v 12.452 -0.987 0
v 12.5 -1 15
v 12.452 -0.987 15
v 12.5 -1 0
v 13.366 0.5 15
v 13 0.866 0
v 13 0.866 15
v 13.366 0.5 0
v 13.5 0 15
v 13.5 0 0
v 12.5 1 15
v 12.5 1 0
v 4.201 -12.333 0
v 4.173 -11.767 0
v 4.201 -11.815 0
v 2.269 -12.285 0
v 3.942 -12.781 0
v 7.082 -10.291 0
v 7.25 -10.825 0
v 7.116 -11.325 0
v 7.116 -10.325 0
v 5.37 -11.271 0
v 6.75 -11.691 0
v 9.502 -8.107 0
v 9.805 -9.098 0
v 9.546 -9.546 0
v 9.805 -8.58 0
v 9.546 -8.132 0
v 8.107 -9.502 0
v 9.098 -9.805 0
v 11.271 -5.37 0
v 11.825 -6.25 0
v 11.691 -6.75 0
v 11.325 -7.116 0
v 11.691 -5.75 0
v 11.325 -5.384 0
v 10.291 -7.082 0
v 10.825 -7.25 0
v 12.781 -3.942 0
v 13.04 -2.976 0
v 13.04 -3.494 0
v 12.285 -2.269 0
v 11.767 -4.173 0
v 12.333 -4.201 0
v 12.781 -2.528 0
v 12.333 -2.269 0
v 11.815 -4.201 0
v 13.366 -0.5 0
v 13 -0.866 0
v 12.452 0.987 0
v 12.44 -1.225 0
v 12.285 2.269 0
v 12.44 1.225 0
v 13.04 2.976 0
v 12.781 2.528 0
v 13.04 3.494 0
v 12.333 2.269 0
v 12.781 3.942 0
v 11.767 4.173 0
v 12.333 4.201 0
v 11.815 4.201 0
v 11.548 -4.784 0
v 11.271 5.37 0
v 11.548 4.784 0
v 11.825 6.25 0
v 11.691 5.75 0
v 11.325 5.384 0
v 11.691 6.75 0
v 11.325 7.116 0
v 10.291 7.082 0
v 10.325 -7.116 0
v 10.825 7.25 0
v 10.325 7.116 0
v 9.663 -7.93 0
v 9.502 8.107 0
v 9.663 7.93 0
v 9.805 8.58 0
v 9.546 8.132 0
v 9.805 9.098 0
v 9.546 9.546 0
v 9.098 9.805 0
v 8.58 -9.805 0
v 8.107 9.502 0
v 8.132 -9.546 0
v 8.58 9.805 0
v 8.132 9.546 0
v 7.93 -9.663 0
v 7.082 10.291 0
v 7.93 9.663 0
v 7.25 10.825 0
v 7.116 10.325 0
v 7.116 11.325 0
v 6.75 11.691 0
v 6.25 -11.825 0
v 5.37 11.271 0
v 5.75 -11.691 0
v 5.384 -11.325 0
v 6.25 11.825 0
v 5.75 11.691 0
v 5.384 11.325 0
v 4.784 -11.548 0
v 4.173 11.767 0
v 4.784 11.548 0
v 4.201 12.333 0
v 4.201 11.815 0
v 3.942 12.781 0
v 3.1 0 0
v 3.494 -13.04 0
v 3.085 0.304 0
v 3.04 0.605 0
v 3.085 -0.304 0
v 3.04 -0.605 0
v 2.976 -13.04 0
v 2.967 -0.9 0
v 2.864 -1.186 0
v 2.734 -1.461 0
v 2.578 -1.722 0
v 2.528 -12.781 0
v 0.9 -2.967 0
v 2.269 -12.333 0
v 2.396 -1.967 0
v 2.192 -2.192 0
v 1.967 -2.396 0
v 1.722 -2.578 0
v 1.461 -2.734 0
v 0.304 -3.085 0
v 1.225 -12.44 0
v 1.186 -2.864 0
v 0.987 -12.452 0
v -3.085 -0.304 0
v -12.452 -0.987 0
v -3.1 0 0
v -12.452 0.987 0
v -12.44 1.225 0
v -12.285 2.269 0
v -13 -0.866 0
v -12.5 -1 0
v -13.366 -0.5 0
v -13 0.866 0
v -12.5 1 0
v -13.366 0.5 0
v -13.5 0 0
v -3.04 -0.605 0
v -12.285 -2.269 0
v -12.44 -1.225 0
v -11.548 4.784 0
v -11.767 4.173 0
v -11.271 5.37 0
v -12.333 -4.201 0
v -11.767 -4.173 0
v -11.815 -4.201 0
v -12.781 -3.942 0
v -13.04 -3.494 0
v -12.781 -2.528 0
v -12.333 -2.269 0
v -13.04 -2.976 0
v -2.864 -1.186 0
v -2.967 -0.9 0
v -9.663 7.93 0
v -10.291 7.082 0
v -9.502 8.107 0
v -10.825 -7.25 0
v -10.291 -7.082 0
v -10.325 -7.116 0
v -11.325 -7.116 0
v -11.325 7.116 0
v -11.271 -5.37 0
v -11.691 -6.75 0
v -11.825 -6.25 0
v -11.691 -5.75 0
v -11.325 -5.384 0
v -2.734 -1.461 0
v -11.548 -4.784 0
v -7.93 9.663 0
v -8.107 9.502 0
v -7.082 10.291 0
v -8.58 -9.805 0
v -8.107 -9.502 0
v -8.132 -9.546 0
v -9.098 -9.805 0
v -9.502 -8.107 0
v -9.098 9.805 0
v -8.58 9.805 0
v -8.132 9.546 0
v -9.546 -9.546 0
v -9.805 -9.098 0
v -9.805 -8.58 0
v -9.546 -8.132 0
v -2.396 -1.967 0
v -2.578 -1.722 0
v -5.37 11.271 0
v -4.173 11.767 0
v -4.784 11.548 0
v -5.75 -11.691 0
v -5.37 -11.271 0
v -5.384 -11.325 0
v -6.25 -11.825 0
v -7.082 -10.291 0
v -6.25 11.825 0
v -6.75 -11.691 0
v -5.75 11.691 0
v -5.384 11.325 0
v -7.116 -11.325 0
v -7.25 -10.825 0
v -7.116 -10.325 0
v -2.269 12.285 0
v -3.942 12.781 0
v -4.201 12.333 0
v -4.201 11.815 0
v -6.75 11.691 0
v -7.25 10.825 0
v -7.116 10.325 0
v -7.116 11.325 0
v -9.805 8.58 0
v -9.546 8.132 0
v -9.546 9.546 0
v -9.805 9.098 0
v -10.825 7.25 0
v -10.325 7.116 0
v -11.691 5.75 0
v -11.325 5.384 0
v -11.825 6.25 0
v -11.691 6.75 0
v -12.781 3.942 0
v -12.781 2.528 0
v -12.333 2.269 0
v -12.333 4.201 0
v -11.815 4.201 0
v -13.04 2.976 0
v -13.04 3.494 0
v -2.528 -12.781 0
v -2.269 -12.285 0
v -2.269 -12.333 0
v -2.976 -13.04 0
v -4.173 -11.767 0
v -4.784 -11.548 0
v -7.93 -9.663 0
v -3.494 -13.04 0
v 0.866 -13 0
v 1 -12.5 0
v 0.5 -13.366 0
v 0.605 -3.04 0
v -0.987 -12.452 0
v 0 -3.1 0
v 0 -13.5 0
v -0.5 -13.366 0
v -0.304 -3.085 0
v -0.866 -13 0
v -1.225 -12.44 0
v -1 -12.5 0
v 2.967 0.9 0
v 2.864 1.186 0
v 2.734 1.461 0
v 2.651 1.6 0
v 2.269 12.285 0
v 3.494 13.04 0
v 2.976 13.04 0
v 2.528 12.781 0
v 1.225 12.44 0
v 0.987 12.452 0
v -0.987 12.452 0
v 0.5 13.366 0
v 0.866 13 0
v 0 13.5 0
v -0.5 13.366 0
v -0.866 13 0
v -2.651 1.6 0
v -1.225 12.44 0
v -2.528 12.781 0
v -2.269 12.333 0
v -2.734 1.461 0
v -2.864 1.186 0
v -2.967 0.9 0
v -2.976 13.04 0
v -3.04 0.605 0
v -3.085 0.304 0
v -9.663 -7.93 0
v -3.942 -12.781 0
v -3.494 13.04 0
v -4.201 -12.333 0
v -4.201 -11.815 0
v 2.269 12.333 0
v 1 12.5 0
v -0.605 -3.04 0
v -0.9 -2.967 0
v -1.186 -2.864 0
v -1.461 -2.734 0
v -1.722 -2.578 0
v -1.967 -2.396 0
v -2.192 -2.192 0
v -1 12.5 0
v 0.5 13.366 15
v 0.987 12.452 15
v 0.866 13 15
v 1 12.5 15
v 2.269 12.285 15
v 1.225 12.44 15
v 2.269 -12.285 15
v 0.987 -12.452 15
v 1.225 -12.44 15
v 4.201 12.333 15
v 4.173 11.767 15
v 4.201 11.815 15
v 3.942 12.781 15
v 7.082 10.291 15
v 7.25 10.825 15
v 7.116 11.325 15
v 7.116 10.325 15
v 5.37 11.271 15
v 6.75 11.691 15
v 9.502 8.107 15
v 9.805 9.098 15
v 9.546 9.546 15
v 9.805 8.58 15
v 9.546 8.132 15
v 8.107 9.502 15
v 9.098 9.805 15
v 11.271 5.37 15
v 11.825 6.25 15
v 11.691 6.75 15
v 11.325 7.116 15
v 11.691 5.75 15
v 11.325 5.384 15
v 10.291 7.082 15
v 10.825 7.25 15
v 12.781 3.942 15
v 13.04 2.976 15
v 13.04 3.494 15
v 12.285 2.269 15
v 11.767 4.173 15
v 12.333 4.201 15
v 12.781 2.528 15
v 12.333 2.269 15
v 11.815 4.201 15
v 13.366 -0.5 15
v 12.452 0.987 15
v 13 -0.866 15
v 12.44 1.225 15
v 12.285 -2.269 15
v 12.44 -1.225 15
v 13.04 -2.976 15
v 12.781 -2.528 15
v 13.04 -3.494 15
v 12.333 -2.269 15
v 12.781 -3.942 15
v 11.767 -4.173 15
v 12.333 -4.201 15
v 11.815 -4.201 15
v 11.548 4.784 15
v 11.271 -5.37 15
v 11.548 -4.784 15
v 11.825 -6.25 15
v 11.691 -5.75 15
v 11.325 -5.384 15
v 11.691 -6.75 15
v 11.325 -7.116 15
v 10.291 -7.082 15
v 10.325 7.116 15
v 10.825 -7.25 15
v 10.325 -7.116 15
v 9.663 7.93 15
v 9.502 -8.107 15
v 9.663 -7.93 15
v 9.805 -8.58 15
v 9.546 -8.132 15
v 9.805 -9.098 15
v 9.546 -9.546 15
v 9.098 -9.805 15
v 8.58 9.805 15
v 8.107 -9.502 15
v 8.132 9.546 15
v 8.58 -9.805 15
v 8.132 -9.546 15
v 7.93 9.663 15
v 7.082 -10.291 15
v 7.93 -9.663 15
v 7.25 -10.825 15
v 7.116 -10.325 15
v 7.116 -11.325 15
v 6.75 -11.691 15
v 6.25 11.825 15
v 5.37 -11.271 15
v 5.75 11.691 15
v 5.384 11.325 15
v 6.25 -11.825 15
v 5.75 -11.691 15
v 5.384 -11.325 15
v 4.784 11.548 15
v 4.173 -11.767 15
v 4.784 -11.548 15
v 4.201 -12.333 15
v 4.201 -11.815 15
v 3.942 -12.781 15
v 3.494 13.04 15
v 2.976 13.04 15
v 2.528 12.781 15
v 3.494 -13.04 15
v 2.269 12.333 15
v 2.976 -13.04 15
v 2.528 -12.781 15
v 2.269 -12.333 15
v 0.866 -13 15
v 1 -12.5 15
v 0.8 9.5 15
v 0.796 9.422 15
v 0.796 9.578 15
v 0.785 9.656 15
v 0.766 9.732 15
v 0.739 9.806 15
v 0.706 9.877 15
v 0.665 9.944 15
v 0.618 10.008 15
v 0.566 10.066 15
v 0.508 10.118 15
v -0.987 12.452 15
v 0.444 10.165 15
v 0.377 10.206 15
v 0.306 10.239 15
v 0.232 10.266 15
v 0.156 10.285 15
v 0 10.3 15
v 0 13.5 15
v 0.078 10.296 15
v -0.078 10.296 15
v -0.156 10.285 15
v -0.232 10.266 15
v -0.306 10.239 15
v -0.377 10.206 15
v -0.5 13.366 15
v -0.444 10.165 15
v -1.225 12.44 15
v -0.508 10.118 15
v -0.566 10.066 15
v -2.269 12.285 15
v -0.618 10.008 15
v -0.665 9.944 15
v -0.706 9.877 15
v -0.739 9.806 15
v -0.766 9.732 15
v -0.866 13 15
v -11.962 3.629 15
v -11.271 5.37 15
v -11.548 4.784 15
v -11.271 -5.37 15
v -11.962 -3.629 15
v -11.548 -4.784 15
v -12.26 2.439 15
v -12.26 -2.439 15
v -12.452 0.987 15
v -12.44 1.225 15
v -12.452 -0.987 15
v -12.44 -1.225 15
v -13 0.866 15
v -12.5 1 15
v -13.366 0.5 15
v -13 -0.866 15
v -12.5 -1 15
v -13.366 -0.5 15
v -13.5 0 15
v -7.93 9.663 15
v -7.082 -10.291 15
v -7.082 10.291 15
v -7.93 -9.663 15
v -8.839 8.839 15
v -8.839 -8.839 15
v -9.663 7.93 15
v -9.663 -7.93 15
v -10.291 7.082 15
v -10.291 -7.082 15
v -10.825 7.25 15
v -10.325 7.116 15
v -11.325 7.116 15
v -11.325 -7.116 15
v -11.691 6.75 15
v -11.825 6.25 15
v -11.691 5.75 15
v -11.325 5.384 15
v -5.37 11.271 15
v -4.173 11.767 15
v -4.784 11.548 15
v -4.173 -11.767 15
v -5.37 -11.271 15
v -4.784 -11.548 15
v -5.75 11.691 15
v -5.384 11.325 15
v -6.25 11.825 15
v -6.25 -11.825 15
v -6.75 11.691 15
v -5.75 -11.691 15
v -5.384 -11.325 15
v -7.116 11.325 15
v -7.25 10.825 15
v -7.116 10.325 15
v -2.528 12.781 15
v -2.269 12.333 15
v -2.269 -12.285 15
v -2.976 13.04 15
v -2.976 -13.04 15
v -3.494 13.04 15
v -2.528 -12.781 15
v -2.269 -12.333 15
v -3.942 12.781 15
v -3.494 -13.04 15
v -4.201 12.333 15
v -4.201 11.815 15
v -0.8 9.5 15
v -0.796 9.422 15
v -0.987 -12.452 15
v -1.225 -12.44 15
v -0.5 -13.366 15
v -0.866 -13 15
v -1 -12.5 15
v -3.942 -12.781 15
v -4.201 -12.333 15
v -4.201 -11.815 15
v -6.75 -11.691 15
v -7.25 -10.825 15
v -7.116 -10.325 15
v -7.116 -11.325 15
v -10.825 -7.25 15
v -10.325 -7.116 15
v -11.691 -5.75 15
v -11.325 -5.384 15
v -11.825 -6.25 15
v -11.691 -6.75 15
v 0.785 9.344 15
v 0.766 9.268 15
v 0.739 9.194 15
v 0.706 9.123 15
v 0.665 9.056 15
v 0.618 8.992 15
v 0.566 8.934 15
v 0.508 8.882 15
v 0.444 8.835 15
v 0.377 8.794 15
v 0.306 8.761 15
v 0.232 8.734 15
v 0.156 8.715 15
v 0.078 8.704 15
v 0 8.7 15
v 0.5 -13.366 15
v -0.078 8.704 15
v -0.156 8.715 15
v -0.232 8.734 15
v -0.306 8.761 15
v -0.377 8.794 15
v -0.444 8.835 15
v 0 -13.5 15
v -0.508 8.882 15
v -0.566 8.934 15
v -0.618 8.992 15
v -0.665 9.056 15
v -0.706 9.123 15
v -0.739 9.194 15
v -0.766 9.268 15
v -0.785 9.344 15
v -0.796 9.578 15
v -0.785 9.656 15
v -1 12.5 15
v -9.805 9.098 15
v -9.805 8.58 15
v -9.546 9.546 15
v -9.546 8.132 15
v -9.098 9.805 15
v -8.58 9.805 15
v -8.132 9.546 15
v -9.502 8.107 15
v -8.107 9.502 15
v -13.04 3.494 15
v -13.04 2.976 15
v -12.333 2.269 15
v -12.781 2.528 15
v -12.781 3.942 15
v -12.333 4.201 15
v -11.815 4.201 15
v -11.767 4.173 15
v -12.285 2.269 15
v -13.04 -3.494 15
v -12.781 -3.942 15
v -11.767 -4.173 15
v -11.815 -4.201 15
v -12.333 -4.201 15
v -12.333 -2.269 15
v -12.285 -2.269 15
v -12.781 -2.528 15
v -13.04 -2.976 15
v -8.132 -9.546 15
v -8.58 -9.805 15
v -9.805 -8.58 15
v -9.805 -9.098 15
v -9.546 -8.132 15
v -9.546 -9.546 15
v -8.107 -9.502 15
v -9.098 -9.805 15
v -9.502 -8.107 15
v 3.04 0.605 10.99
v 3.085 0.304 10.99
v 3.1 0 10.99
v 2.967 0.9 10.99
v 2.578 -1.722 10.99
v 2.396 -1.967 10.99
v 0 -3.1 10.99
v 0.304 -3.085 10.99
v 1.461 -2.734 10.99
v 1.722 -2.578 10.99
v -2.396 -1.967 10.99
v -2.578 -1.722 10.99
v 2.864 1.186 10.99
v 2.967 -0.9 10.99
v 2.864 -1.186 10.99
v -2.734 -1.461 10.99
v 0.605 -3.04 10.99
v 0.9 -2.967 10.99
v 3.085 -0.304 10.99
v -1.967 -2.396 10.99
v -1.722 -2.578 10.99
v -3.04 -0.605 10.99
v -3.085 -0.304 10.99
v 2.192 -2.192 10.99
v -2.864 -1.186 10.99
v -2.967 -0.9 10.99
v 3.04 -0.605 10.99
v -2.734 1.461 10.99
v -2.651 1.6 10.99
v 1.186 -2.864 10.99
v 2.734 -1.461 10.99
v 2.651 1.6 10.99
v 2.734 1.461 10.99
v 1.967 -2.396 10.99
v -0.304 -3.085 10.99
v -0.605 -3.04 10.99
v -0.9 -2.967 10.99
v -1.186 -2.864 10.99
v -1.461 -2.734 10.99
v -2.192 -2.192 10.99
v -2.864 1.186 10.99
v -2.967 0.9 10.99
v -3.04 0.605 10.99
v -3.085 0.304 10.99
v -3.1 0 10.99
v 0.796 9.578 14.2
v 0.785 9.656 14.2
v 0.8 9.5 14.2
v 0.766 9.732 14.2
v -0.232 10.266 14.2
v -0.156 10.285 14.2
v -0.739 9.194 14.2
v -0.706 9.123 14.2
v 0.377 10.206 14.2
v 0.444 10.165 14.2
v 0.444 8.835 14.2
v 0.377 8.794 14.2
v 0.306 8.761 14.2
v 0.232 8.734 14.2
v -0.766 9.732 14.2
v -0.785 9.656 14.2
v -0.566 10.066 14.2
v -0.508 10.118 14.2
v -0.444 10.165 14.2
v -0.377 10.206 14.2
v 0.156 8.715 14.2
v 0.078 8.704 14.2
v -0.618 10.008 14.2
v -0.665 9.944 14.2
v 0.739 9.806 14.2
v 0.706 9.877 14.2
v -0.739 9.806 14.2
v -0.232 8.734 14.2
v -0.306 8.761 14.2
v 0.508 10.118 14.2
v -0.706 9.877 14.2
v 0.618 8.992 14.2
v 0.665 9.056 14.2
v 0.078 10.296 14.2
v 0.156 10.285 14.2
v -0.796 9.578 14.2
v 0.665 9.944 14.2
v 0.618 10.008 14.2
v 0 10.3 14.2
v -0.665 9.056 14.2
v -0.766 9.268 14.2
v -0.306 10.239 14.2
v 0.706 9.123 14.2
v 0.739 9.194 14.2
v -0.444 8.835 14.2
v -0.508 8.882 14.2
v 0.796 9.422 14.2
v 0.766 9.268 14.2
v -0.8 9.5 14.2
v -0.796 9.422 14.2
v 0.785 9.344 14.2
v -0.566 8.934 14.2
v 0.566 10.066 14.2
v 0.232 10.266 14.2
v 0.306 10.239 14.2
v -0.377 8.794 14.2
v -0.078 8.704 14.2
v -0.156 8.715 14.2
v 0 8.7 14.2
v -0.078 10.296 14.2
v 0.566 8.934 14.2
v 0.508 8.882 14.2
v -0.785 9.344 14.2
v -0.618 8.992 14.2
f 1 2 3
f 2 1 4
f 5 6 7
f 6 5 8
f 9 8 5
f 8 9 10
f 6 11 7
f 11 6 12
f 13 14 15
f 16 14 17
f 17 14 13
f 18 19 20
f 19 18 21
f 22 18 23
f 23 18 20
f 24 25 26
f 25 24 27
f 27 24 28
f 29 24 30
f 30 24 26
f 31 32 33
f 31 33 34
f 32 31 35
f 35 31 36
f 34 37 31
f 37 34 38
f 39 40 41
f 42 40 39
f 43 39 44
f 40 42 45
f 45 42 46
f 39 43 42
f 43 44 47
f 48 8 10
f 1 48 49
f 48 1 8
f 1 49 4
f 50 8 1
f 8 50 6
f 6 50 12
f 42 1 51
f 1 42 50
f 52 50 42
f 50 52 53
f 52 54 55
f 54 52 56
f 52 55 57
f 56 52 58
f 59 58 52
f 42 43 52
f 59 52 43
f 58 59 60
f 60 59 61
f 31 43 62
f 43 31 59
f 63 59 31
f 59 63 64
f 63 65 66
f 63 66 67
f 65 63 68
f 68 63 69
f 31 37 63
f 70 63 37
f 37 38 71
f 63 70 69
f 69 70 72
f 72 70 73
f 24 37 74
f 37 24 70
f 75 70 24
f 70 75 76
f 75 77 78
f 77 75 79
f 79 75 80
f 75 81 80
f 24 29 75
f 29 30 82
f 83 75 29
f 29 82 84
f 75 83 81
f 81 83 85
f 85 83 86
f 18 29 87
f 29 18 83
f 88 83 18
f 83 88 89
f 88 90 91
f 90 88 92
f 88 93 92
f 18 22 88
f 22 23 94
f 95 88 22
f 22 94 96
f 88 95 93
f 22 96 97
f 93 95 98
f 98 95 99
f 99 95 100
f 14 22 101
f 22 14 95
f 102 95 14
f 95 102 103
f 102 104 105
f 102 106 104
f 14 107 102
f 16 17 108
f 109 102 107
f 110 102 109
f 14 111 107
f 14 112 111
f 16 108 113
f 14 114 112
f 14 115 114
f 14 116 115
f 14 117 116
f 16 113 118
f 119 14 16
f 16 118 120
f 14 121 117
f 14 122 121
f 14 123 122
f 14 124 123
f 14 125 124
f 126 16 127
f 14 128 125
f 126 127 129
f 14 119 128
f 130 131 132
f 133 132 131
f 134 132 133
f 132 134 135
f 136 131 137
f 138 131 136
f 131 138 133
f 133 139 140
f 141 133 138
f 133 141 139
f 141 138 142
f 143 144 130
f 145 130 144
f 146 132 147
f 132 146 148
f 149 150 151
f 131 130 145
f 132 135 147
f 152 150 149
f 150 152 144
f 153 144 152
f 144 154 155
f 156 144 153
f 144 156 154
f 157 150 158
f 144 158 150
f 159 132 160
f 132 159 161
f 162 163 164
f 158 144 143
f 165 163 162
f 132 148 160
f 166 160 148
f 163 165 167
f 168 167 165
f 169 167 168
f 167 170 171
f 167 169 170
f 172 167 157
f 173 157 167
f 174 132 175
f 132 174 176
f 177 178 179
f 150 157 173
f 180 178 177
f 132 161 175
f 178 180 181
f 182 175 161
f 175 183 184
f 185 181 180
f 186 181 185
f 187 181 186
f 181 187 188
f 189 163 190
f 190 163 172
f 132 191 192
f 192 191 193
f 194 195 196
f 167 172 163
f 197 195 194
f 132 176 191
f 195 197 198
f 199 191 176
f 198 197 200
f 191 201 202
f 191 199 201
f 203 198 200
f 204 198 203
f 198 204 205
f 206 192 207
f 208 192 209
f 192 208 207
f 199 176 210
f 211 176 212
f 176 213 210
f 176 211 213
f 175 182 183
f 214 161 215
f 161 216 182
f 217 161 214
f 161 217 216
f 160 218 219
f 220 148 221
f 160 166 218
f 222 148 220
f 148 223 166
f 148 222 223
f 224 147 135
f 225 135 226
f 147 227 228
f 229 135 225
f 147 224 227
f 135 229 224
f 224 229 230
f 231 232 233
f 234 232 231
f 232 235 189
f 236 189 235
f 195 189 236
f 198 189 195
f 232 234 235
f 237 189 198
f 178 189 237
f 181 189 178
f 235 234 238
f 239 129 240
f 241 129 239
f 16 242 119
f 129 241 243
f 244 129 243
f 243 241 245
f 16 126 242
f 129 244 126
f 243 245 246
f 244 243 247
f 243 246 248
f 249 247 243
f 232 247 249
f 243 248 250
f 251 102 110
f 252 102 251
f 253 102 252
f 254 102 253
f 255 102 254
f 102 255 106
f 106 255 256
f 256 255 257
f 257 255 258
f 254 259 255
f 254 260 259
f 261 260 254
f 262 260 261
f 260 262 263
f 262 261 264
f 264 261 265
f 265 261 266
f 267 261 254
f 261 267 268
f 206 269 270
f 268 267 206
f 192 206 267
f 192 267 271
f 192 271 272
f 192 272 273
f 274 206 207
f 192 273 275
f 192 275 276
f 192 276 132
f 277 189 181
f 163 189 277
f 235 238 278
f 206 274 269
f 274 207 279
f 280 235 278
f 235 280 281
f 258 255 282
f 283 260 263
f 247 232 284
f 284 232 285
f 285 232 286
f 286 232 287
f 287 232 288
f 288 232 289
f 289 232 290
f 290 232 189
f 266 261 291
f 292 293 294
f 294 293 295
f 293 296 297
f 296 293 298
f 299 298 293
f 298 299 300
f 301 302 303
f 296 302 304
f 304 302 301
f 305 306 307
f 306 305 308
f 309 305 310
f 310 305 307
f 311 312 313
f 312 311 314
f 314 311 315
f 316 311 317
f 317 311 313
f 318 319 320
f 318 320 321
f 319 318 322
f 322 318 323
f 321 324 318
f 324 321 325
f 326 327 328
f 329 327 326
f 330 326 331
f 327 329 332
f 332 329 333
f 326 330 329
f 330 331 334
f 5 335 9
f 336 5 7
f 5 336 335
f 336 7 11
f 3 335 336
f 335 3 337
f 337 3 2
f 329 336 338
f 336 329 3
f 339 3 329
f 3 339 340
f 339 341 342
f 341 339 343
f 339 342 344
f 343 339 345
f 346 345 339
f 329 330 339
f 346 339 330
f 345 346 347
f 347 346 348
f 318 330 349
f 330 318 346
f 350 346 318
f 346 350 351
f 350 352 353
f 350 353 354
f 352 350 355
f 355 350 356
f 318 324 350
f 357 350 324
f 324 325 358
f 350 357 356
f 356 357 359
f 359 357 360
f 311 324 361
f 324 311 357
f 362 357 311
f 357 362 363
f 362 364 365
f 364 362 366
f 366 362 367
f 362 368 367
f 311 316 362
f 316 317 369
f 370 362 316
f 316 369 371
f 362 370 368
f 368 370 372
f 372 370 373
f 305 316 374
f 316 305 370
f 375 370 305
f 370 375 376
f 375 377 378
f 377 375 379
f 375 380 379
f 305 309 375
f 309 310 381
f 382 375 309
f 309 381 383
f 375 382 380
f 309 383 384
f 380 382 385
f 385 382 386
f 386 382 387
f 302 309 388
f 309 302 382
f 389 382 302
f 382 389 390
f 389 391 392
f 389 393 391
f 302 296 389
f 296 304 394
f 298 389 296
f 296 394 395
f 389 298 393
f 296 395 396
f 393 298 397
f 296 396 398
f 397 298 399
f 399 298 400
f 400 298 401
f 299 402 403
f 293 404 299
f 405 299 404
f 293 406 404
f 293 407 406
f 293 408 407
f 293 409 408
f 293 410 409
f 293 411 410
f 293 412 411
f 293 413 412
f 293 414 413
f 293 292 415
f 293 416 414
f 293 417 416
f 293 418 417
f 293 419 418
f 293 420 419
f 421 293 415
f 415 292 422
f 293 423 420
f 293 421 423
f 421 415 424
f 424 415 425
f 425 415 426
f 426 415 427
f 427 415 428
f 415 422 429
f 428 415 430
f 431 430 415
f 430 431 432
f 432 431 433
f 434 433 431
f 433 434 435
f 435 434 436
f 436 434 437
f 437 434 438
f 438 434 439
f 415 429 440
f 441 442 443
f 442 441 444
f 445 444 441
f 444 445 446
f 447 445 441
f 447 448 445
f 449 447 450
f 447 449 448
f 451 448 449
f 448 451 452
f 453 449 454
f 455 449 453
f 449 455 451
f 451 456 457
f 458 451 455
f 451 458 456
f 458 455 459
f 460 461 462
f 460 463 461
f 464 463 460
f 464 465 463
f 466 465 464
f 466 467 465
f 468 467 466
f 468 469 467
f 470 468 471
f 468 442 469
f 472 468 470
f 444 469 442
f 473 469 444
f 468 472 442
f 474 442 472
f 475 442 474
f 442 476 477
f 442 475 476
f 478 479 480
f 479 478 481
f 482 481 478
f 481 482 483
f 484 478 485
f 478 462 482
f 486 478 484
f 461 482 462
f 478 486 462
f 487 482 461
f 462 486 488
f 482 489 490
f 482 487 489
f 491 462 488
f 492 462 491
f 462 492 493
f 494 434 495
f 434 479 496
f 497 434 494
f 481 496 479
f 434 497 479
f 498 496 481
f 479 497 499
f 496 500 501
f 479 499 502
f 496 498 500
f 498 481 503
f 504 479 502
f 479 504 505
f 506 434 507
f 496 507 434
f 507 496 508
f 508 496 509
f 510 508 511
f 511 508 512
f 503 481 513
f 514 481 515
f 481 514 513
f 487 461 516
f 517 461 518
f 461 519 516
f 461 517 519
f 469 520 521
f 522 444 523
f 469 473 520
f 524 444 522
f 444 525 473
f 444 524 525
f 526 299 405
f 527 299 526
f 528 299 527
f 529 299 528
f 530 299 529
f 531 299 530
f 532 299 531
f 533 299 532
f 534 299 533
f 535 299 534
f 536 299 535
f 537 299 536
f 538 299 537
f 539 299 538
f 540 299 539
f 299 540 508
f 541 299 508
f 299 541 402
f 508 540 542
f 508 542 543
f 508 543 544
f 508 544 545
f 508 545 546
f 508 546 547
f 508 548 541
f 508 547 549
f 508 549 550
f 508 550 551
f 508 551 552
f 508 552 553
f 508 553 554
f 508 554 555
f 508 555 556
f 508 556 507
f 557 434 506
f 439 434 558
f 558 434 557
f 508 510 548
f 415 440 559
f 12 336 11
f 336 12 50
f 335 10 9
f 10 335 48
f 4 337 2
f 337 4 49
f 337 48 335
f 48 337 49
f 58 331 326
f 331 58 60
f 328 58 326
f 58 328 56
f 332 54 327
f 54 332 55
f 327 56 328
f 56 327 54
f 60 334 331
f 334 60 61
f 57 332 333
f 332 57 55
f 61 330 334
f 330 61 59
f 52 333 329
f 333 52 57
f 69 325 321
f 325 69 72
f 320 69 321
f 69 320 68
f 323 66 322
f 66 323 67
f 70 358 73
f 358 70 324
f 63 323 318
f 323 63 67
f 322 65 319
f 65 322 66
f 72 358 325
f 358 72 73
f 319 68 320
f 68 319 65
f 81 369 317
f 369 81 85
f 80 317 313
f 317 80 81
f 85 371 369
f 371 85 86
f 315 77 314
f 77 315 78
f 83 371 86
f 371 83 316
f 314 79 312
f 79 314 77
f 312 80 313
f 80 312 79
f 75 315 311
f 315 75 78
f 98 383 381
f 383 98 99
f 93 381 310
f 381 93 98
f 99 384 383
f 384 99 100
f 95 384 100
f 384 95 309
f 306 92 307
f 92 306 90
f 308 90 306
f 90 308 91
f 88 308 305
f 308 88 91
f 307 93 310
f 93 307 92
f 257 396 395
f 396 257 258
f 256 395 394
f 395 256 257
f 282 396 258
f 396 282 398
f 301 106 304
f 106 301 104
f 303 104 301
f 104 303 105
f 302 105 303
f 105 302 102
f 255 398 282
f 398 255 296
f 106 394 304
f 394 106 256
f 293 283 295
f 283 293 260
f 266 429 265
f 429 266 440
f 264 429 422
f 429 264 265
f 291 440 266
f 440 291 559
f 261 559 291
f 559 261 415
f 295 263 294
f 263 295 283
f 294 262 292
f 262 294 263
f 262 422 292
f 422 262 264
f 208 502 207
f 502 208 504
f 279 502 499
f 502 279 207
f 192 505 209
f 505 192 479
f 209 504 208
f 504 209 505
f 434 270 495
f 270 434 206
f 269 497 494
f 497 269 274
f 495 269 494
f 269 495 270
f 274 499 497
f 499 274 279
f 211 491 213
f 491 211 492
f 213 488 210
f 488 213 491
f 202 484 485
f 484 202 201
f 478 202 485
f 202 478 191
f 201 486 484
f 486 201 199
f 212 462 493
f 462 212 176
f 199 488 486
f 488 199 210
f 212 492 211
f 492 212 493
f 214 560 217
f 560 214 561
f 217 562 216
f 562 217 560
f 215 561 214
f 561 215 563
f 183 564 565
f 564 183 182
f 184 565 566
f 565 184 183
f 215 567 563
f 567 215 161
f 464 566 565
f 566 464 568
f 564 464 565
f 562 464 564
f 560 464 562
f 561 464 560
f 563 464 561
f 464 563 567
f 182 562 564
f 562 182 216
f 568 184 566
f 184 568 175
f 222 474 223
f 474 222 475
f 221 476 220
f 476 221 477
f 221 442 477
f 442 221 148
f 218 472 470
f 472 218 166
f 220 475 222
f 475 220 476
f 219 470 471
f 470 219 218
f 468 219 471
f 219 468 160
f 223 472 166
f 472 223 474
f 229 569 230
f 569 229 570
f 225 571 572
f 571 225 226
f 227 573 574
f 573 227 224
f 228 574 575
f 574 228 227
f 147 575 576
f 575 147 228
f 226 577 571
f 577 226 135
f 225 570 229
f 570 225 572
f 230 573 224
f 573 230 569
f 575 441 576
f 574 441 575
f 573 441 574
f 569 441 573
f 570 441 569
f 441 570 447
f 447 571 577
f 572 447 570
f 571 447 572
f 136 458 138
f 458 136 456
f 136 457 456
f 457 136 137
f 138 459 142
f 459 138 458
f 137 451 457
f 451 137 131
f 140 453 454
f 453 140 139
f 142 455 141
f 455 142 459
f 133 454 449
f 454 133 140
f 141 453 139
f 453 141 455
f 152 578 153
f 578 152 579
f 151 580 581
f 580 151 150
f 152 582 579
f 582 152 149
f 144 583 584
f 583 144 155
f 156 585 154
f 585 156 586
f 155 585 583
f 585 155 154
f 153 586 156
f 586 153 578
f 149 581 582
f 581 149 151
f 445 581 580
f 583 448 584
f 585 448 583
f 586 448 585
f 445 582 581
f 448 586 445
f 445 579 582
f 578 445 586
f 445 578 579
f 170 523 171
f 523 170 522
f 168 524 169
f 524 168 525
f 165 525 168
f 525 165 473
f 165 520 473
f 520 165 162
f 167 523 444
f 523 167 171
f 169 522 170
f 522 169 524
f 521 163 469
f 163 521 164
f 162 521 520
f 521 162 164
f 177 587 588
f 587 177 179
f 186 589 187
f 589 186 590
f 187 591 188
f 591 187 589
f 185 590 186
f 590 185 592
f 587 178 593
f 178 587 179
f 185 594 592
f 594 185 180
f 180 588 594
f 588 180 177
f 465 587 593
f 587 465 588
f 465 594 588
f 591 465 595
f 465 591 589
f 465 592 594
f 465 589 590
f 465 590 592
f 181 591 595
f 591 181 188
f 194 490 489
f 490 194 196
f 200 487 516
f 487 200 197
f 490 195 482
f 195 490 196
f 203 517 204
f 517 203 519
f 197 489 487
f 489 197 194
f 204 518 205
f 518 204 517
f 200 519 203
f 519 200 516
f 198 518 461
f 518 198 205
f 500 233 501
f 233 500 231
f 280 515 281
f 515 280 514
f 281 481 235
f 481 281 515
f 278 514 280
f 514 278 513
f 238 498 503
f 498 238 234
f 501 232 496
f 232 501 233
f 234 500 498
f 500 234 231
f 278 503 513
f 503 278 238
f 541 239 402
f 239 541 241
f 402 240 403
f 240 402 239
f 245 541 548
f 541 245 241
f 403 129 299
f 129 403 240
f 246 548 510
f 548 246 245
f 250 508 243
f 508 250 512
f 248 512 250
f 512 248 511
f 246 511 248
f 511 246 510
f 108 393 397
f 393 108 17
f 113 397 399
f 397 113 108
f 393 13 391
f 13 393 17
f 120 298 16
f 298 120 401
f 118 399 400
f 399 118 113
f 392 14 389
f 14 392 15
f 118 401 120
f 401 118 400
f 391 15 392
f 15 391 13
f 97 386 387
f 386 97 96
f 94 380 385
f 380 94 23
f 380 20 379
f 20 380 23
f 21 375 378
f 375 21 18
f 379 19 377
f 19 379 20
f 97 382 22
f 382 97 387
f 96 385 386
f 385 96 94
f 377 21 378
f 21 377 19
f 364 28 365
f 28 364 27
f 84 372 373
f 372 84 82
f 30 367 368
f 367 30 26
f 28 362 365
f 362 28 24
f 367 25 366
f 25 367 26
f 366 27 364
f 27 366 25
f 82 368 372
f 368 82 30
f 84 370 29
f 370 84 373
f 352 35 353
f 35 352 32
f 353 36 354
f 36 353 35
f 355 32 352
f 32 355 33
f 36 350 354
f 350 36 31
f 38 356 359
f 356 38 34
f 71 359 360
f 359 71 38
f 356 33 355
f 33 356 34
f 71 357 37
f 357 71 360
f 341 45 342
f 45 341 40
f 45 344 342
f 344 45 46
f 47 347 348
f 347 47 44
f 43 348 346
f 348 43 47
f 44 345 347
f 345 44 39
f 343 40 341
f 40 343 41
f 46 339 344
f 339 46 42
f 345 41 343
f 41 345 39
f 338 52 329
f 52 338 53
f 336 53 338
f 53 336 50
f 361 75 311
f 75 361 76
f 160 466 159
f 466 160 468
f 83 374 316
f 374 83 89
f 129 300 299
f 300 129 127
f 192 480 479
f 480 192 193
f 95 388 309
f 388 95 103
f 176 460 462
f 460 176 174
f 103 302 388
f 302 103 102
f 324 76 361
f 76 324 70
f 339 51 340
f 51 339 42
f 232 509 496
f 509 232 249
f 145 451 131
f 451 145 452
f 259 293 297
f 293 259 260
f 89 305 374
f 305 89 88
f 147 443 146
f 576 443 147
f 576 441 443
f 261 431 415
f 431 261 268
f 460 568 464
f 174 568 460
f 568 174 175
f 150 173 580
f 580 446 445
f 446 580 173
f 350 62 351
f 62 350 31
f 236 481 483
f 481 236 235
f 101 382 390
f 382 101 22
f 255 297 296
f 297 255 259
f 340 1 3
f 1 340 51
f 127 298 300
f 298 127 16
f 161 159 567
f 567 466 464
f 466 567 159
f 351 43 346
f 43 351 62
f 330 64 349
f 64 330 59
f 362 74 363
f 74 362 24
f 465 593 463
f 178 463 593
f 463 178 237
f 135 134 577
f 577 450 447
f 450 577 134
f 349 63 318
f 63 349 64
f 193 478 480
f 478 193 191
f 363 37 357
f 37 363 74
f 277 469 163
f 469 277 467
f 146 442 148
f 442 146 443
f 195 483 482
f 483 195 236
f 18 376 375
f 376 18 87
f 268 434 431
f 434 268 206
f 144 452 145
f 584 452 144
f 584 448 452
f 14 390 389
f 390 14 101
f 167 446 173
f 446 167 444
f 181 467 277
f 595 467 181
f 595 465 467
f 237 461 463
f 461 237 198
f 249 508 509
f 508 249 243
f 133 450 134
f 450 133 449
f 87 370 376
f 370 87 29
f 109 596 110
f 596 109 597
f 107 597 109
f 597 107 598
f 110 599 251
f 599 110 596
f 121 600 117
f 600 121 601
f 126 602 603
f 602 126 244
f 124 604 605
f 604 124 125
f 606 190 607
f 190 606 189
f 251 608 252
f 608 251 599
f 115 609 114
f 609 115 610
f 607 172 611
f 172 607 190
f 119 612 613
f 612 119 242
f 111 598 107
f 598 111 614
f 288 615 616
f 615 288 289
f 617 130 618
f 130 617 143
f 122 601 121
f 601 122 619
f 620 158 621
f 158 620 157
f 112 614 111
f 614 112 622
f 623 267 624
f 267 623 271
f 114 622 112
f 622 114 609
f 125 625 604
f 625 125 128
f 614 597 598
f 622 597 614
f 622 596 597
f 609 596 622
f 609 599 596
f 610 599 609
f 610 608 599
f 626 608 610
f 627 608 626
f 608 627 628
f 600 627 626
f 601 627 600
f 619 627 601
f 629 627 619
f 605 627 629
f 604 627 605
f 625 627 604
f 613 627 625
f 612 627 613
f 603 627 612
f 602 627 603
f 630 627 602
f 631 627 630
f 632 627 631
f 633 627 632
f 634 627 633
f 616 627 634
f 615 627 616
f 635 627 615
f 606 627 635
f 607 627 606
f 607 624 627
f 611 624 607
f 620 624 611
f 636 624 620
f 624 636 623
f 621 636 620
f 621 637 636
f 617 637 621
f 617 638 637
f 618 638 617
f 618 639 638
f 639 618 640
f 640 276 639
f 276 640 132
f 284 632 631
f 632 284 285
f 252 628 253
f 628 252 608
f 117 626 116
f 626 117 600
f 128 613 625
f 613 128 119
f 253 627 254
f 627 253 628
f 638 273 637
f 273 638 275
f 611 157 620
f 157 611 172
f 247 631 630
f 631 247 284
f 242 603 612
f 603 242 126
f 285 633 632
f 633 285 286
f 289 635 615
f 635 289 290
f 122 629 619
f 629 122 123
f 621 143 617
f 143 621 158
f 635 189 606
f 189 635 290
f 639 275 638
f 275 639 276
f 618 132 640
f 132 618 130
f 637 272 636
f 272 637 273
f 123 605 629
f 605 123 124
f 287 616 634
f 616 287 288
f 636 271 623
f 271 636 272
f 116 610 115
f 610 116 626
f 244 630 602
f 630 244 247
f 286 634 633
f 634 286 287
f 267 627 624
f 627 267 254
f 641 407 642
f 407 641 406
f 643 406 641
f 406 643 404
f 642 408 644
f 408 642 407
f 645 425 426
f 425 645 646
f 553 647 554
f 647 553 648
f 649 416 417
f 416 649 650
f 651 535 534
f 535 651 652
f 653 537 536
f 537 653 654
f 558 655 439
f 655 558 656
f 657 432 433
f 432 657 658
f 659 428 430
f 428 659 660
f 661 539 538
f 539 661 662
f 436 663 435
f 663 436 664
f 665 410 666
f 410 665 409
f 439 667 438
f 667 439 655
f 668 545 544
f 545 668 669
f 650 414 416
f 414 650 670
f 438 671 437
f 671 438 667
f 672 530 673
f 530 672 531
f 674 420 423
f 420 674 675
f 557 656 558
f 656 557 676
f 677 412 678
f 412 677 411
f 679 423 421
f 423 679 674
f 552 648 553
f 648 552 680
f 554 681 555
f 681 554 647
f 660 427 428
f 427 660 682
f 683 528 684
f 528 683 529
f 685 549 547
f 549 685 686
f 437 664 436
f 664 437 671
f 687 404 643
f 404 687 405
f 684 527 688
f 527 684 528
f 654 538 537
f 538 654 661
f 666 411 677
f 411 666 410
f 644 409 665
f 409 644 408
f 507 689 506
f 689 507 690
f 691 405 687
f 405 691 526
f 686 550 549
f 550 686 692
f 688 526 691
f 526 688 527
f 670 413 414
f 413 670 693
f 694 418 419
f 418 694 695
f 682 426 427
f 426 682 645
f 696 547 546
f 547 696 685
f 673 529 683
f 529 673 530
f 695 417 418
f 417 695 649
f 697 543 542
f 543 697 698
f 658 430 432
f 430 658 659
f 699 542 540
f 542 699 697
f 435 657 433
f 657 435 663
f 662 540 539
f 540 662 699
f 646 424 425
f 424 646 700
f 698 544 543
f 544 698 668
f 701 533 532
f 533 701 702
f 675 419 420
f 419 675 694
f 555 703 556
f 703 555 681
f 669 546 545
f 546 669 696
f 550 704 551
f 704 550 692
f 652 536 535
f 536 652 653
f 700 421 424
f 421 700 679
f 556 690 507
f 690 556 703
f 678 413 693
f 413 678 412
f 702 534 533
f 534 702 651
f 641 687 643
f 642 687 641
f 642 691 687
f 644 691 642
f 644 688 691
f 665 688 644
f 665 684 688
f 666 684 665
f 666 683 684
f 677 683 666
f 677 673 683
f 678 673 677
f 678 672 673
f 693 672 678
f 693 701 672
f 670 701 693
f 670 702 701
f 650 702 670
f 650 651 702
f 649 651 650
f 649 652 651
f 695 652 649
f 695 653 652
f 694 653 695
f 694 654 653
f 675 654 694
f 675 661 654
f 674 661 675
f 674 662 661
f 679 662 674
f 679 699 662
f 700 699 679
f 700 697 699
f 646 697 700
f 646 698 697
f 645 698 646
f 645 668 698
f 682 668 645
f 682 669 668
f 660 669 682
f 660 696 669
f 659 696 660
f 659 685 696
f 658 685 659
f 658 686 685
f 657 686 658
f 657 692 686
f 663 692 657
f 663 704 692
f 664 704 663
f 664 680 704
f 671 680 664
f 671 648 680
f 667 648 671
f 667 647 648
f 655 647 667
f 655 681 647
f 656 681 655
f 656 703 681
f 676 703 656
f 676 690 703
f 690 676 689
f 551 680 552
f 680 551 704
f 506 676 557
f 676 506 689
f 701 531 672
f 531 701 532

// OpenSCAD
// Knurled control knob. CC0 (public domain), made for Ember's parts library.
// D-shaft: shaft_d with a flat at flat_d (e.g. 6 mm shaft, 4.5 mm across the flat). flat_d = 0 -> round + M3 set screw.
dia = 25; height = 15; shaft_d = 6.2; flat_d = 4.7; depth = 11; ridges = 24;
$fn = 64;
difference() {
  union() {
    cylinder(d = dia, h = height);
    for (i = [0 : ridges - 1]) rotate(i * 360 / ridges) translate([dia / 2, 0, 0]) cylinder(d = 2, h = height, $fn = 12);
  }
  translate([0, 0, -0.01]) intersection() {
    cylinder(d = shaft_d, h = depth);
    if (flat_d > 0) translate([-shaft_d / 2, -shaft_d / 2, 0]) cube([shaft_d, flat_d, depth]);
  }
  if (flat_d == 0) translate([0, 0, depth / 2]) rotate([0, 90, 0]) cylinder(d = 2.6, h = dia);
  translate([0, dia / 2 - 3, height - 0.8]) cylinder(d = 1.6, h = 1);  // pointer dot
}
